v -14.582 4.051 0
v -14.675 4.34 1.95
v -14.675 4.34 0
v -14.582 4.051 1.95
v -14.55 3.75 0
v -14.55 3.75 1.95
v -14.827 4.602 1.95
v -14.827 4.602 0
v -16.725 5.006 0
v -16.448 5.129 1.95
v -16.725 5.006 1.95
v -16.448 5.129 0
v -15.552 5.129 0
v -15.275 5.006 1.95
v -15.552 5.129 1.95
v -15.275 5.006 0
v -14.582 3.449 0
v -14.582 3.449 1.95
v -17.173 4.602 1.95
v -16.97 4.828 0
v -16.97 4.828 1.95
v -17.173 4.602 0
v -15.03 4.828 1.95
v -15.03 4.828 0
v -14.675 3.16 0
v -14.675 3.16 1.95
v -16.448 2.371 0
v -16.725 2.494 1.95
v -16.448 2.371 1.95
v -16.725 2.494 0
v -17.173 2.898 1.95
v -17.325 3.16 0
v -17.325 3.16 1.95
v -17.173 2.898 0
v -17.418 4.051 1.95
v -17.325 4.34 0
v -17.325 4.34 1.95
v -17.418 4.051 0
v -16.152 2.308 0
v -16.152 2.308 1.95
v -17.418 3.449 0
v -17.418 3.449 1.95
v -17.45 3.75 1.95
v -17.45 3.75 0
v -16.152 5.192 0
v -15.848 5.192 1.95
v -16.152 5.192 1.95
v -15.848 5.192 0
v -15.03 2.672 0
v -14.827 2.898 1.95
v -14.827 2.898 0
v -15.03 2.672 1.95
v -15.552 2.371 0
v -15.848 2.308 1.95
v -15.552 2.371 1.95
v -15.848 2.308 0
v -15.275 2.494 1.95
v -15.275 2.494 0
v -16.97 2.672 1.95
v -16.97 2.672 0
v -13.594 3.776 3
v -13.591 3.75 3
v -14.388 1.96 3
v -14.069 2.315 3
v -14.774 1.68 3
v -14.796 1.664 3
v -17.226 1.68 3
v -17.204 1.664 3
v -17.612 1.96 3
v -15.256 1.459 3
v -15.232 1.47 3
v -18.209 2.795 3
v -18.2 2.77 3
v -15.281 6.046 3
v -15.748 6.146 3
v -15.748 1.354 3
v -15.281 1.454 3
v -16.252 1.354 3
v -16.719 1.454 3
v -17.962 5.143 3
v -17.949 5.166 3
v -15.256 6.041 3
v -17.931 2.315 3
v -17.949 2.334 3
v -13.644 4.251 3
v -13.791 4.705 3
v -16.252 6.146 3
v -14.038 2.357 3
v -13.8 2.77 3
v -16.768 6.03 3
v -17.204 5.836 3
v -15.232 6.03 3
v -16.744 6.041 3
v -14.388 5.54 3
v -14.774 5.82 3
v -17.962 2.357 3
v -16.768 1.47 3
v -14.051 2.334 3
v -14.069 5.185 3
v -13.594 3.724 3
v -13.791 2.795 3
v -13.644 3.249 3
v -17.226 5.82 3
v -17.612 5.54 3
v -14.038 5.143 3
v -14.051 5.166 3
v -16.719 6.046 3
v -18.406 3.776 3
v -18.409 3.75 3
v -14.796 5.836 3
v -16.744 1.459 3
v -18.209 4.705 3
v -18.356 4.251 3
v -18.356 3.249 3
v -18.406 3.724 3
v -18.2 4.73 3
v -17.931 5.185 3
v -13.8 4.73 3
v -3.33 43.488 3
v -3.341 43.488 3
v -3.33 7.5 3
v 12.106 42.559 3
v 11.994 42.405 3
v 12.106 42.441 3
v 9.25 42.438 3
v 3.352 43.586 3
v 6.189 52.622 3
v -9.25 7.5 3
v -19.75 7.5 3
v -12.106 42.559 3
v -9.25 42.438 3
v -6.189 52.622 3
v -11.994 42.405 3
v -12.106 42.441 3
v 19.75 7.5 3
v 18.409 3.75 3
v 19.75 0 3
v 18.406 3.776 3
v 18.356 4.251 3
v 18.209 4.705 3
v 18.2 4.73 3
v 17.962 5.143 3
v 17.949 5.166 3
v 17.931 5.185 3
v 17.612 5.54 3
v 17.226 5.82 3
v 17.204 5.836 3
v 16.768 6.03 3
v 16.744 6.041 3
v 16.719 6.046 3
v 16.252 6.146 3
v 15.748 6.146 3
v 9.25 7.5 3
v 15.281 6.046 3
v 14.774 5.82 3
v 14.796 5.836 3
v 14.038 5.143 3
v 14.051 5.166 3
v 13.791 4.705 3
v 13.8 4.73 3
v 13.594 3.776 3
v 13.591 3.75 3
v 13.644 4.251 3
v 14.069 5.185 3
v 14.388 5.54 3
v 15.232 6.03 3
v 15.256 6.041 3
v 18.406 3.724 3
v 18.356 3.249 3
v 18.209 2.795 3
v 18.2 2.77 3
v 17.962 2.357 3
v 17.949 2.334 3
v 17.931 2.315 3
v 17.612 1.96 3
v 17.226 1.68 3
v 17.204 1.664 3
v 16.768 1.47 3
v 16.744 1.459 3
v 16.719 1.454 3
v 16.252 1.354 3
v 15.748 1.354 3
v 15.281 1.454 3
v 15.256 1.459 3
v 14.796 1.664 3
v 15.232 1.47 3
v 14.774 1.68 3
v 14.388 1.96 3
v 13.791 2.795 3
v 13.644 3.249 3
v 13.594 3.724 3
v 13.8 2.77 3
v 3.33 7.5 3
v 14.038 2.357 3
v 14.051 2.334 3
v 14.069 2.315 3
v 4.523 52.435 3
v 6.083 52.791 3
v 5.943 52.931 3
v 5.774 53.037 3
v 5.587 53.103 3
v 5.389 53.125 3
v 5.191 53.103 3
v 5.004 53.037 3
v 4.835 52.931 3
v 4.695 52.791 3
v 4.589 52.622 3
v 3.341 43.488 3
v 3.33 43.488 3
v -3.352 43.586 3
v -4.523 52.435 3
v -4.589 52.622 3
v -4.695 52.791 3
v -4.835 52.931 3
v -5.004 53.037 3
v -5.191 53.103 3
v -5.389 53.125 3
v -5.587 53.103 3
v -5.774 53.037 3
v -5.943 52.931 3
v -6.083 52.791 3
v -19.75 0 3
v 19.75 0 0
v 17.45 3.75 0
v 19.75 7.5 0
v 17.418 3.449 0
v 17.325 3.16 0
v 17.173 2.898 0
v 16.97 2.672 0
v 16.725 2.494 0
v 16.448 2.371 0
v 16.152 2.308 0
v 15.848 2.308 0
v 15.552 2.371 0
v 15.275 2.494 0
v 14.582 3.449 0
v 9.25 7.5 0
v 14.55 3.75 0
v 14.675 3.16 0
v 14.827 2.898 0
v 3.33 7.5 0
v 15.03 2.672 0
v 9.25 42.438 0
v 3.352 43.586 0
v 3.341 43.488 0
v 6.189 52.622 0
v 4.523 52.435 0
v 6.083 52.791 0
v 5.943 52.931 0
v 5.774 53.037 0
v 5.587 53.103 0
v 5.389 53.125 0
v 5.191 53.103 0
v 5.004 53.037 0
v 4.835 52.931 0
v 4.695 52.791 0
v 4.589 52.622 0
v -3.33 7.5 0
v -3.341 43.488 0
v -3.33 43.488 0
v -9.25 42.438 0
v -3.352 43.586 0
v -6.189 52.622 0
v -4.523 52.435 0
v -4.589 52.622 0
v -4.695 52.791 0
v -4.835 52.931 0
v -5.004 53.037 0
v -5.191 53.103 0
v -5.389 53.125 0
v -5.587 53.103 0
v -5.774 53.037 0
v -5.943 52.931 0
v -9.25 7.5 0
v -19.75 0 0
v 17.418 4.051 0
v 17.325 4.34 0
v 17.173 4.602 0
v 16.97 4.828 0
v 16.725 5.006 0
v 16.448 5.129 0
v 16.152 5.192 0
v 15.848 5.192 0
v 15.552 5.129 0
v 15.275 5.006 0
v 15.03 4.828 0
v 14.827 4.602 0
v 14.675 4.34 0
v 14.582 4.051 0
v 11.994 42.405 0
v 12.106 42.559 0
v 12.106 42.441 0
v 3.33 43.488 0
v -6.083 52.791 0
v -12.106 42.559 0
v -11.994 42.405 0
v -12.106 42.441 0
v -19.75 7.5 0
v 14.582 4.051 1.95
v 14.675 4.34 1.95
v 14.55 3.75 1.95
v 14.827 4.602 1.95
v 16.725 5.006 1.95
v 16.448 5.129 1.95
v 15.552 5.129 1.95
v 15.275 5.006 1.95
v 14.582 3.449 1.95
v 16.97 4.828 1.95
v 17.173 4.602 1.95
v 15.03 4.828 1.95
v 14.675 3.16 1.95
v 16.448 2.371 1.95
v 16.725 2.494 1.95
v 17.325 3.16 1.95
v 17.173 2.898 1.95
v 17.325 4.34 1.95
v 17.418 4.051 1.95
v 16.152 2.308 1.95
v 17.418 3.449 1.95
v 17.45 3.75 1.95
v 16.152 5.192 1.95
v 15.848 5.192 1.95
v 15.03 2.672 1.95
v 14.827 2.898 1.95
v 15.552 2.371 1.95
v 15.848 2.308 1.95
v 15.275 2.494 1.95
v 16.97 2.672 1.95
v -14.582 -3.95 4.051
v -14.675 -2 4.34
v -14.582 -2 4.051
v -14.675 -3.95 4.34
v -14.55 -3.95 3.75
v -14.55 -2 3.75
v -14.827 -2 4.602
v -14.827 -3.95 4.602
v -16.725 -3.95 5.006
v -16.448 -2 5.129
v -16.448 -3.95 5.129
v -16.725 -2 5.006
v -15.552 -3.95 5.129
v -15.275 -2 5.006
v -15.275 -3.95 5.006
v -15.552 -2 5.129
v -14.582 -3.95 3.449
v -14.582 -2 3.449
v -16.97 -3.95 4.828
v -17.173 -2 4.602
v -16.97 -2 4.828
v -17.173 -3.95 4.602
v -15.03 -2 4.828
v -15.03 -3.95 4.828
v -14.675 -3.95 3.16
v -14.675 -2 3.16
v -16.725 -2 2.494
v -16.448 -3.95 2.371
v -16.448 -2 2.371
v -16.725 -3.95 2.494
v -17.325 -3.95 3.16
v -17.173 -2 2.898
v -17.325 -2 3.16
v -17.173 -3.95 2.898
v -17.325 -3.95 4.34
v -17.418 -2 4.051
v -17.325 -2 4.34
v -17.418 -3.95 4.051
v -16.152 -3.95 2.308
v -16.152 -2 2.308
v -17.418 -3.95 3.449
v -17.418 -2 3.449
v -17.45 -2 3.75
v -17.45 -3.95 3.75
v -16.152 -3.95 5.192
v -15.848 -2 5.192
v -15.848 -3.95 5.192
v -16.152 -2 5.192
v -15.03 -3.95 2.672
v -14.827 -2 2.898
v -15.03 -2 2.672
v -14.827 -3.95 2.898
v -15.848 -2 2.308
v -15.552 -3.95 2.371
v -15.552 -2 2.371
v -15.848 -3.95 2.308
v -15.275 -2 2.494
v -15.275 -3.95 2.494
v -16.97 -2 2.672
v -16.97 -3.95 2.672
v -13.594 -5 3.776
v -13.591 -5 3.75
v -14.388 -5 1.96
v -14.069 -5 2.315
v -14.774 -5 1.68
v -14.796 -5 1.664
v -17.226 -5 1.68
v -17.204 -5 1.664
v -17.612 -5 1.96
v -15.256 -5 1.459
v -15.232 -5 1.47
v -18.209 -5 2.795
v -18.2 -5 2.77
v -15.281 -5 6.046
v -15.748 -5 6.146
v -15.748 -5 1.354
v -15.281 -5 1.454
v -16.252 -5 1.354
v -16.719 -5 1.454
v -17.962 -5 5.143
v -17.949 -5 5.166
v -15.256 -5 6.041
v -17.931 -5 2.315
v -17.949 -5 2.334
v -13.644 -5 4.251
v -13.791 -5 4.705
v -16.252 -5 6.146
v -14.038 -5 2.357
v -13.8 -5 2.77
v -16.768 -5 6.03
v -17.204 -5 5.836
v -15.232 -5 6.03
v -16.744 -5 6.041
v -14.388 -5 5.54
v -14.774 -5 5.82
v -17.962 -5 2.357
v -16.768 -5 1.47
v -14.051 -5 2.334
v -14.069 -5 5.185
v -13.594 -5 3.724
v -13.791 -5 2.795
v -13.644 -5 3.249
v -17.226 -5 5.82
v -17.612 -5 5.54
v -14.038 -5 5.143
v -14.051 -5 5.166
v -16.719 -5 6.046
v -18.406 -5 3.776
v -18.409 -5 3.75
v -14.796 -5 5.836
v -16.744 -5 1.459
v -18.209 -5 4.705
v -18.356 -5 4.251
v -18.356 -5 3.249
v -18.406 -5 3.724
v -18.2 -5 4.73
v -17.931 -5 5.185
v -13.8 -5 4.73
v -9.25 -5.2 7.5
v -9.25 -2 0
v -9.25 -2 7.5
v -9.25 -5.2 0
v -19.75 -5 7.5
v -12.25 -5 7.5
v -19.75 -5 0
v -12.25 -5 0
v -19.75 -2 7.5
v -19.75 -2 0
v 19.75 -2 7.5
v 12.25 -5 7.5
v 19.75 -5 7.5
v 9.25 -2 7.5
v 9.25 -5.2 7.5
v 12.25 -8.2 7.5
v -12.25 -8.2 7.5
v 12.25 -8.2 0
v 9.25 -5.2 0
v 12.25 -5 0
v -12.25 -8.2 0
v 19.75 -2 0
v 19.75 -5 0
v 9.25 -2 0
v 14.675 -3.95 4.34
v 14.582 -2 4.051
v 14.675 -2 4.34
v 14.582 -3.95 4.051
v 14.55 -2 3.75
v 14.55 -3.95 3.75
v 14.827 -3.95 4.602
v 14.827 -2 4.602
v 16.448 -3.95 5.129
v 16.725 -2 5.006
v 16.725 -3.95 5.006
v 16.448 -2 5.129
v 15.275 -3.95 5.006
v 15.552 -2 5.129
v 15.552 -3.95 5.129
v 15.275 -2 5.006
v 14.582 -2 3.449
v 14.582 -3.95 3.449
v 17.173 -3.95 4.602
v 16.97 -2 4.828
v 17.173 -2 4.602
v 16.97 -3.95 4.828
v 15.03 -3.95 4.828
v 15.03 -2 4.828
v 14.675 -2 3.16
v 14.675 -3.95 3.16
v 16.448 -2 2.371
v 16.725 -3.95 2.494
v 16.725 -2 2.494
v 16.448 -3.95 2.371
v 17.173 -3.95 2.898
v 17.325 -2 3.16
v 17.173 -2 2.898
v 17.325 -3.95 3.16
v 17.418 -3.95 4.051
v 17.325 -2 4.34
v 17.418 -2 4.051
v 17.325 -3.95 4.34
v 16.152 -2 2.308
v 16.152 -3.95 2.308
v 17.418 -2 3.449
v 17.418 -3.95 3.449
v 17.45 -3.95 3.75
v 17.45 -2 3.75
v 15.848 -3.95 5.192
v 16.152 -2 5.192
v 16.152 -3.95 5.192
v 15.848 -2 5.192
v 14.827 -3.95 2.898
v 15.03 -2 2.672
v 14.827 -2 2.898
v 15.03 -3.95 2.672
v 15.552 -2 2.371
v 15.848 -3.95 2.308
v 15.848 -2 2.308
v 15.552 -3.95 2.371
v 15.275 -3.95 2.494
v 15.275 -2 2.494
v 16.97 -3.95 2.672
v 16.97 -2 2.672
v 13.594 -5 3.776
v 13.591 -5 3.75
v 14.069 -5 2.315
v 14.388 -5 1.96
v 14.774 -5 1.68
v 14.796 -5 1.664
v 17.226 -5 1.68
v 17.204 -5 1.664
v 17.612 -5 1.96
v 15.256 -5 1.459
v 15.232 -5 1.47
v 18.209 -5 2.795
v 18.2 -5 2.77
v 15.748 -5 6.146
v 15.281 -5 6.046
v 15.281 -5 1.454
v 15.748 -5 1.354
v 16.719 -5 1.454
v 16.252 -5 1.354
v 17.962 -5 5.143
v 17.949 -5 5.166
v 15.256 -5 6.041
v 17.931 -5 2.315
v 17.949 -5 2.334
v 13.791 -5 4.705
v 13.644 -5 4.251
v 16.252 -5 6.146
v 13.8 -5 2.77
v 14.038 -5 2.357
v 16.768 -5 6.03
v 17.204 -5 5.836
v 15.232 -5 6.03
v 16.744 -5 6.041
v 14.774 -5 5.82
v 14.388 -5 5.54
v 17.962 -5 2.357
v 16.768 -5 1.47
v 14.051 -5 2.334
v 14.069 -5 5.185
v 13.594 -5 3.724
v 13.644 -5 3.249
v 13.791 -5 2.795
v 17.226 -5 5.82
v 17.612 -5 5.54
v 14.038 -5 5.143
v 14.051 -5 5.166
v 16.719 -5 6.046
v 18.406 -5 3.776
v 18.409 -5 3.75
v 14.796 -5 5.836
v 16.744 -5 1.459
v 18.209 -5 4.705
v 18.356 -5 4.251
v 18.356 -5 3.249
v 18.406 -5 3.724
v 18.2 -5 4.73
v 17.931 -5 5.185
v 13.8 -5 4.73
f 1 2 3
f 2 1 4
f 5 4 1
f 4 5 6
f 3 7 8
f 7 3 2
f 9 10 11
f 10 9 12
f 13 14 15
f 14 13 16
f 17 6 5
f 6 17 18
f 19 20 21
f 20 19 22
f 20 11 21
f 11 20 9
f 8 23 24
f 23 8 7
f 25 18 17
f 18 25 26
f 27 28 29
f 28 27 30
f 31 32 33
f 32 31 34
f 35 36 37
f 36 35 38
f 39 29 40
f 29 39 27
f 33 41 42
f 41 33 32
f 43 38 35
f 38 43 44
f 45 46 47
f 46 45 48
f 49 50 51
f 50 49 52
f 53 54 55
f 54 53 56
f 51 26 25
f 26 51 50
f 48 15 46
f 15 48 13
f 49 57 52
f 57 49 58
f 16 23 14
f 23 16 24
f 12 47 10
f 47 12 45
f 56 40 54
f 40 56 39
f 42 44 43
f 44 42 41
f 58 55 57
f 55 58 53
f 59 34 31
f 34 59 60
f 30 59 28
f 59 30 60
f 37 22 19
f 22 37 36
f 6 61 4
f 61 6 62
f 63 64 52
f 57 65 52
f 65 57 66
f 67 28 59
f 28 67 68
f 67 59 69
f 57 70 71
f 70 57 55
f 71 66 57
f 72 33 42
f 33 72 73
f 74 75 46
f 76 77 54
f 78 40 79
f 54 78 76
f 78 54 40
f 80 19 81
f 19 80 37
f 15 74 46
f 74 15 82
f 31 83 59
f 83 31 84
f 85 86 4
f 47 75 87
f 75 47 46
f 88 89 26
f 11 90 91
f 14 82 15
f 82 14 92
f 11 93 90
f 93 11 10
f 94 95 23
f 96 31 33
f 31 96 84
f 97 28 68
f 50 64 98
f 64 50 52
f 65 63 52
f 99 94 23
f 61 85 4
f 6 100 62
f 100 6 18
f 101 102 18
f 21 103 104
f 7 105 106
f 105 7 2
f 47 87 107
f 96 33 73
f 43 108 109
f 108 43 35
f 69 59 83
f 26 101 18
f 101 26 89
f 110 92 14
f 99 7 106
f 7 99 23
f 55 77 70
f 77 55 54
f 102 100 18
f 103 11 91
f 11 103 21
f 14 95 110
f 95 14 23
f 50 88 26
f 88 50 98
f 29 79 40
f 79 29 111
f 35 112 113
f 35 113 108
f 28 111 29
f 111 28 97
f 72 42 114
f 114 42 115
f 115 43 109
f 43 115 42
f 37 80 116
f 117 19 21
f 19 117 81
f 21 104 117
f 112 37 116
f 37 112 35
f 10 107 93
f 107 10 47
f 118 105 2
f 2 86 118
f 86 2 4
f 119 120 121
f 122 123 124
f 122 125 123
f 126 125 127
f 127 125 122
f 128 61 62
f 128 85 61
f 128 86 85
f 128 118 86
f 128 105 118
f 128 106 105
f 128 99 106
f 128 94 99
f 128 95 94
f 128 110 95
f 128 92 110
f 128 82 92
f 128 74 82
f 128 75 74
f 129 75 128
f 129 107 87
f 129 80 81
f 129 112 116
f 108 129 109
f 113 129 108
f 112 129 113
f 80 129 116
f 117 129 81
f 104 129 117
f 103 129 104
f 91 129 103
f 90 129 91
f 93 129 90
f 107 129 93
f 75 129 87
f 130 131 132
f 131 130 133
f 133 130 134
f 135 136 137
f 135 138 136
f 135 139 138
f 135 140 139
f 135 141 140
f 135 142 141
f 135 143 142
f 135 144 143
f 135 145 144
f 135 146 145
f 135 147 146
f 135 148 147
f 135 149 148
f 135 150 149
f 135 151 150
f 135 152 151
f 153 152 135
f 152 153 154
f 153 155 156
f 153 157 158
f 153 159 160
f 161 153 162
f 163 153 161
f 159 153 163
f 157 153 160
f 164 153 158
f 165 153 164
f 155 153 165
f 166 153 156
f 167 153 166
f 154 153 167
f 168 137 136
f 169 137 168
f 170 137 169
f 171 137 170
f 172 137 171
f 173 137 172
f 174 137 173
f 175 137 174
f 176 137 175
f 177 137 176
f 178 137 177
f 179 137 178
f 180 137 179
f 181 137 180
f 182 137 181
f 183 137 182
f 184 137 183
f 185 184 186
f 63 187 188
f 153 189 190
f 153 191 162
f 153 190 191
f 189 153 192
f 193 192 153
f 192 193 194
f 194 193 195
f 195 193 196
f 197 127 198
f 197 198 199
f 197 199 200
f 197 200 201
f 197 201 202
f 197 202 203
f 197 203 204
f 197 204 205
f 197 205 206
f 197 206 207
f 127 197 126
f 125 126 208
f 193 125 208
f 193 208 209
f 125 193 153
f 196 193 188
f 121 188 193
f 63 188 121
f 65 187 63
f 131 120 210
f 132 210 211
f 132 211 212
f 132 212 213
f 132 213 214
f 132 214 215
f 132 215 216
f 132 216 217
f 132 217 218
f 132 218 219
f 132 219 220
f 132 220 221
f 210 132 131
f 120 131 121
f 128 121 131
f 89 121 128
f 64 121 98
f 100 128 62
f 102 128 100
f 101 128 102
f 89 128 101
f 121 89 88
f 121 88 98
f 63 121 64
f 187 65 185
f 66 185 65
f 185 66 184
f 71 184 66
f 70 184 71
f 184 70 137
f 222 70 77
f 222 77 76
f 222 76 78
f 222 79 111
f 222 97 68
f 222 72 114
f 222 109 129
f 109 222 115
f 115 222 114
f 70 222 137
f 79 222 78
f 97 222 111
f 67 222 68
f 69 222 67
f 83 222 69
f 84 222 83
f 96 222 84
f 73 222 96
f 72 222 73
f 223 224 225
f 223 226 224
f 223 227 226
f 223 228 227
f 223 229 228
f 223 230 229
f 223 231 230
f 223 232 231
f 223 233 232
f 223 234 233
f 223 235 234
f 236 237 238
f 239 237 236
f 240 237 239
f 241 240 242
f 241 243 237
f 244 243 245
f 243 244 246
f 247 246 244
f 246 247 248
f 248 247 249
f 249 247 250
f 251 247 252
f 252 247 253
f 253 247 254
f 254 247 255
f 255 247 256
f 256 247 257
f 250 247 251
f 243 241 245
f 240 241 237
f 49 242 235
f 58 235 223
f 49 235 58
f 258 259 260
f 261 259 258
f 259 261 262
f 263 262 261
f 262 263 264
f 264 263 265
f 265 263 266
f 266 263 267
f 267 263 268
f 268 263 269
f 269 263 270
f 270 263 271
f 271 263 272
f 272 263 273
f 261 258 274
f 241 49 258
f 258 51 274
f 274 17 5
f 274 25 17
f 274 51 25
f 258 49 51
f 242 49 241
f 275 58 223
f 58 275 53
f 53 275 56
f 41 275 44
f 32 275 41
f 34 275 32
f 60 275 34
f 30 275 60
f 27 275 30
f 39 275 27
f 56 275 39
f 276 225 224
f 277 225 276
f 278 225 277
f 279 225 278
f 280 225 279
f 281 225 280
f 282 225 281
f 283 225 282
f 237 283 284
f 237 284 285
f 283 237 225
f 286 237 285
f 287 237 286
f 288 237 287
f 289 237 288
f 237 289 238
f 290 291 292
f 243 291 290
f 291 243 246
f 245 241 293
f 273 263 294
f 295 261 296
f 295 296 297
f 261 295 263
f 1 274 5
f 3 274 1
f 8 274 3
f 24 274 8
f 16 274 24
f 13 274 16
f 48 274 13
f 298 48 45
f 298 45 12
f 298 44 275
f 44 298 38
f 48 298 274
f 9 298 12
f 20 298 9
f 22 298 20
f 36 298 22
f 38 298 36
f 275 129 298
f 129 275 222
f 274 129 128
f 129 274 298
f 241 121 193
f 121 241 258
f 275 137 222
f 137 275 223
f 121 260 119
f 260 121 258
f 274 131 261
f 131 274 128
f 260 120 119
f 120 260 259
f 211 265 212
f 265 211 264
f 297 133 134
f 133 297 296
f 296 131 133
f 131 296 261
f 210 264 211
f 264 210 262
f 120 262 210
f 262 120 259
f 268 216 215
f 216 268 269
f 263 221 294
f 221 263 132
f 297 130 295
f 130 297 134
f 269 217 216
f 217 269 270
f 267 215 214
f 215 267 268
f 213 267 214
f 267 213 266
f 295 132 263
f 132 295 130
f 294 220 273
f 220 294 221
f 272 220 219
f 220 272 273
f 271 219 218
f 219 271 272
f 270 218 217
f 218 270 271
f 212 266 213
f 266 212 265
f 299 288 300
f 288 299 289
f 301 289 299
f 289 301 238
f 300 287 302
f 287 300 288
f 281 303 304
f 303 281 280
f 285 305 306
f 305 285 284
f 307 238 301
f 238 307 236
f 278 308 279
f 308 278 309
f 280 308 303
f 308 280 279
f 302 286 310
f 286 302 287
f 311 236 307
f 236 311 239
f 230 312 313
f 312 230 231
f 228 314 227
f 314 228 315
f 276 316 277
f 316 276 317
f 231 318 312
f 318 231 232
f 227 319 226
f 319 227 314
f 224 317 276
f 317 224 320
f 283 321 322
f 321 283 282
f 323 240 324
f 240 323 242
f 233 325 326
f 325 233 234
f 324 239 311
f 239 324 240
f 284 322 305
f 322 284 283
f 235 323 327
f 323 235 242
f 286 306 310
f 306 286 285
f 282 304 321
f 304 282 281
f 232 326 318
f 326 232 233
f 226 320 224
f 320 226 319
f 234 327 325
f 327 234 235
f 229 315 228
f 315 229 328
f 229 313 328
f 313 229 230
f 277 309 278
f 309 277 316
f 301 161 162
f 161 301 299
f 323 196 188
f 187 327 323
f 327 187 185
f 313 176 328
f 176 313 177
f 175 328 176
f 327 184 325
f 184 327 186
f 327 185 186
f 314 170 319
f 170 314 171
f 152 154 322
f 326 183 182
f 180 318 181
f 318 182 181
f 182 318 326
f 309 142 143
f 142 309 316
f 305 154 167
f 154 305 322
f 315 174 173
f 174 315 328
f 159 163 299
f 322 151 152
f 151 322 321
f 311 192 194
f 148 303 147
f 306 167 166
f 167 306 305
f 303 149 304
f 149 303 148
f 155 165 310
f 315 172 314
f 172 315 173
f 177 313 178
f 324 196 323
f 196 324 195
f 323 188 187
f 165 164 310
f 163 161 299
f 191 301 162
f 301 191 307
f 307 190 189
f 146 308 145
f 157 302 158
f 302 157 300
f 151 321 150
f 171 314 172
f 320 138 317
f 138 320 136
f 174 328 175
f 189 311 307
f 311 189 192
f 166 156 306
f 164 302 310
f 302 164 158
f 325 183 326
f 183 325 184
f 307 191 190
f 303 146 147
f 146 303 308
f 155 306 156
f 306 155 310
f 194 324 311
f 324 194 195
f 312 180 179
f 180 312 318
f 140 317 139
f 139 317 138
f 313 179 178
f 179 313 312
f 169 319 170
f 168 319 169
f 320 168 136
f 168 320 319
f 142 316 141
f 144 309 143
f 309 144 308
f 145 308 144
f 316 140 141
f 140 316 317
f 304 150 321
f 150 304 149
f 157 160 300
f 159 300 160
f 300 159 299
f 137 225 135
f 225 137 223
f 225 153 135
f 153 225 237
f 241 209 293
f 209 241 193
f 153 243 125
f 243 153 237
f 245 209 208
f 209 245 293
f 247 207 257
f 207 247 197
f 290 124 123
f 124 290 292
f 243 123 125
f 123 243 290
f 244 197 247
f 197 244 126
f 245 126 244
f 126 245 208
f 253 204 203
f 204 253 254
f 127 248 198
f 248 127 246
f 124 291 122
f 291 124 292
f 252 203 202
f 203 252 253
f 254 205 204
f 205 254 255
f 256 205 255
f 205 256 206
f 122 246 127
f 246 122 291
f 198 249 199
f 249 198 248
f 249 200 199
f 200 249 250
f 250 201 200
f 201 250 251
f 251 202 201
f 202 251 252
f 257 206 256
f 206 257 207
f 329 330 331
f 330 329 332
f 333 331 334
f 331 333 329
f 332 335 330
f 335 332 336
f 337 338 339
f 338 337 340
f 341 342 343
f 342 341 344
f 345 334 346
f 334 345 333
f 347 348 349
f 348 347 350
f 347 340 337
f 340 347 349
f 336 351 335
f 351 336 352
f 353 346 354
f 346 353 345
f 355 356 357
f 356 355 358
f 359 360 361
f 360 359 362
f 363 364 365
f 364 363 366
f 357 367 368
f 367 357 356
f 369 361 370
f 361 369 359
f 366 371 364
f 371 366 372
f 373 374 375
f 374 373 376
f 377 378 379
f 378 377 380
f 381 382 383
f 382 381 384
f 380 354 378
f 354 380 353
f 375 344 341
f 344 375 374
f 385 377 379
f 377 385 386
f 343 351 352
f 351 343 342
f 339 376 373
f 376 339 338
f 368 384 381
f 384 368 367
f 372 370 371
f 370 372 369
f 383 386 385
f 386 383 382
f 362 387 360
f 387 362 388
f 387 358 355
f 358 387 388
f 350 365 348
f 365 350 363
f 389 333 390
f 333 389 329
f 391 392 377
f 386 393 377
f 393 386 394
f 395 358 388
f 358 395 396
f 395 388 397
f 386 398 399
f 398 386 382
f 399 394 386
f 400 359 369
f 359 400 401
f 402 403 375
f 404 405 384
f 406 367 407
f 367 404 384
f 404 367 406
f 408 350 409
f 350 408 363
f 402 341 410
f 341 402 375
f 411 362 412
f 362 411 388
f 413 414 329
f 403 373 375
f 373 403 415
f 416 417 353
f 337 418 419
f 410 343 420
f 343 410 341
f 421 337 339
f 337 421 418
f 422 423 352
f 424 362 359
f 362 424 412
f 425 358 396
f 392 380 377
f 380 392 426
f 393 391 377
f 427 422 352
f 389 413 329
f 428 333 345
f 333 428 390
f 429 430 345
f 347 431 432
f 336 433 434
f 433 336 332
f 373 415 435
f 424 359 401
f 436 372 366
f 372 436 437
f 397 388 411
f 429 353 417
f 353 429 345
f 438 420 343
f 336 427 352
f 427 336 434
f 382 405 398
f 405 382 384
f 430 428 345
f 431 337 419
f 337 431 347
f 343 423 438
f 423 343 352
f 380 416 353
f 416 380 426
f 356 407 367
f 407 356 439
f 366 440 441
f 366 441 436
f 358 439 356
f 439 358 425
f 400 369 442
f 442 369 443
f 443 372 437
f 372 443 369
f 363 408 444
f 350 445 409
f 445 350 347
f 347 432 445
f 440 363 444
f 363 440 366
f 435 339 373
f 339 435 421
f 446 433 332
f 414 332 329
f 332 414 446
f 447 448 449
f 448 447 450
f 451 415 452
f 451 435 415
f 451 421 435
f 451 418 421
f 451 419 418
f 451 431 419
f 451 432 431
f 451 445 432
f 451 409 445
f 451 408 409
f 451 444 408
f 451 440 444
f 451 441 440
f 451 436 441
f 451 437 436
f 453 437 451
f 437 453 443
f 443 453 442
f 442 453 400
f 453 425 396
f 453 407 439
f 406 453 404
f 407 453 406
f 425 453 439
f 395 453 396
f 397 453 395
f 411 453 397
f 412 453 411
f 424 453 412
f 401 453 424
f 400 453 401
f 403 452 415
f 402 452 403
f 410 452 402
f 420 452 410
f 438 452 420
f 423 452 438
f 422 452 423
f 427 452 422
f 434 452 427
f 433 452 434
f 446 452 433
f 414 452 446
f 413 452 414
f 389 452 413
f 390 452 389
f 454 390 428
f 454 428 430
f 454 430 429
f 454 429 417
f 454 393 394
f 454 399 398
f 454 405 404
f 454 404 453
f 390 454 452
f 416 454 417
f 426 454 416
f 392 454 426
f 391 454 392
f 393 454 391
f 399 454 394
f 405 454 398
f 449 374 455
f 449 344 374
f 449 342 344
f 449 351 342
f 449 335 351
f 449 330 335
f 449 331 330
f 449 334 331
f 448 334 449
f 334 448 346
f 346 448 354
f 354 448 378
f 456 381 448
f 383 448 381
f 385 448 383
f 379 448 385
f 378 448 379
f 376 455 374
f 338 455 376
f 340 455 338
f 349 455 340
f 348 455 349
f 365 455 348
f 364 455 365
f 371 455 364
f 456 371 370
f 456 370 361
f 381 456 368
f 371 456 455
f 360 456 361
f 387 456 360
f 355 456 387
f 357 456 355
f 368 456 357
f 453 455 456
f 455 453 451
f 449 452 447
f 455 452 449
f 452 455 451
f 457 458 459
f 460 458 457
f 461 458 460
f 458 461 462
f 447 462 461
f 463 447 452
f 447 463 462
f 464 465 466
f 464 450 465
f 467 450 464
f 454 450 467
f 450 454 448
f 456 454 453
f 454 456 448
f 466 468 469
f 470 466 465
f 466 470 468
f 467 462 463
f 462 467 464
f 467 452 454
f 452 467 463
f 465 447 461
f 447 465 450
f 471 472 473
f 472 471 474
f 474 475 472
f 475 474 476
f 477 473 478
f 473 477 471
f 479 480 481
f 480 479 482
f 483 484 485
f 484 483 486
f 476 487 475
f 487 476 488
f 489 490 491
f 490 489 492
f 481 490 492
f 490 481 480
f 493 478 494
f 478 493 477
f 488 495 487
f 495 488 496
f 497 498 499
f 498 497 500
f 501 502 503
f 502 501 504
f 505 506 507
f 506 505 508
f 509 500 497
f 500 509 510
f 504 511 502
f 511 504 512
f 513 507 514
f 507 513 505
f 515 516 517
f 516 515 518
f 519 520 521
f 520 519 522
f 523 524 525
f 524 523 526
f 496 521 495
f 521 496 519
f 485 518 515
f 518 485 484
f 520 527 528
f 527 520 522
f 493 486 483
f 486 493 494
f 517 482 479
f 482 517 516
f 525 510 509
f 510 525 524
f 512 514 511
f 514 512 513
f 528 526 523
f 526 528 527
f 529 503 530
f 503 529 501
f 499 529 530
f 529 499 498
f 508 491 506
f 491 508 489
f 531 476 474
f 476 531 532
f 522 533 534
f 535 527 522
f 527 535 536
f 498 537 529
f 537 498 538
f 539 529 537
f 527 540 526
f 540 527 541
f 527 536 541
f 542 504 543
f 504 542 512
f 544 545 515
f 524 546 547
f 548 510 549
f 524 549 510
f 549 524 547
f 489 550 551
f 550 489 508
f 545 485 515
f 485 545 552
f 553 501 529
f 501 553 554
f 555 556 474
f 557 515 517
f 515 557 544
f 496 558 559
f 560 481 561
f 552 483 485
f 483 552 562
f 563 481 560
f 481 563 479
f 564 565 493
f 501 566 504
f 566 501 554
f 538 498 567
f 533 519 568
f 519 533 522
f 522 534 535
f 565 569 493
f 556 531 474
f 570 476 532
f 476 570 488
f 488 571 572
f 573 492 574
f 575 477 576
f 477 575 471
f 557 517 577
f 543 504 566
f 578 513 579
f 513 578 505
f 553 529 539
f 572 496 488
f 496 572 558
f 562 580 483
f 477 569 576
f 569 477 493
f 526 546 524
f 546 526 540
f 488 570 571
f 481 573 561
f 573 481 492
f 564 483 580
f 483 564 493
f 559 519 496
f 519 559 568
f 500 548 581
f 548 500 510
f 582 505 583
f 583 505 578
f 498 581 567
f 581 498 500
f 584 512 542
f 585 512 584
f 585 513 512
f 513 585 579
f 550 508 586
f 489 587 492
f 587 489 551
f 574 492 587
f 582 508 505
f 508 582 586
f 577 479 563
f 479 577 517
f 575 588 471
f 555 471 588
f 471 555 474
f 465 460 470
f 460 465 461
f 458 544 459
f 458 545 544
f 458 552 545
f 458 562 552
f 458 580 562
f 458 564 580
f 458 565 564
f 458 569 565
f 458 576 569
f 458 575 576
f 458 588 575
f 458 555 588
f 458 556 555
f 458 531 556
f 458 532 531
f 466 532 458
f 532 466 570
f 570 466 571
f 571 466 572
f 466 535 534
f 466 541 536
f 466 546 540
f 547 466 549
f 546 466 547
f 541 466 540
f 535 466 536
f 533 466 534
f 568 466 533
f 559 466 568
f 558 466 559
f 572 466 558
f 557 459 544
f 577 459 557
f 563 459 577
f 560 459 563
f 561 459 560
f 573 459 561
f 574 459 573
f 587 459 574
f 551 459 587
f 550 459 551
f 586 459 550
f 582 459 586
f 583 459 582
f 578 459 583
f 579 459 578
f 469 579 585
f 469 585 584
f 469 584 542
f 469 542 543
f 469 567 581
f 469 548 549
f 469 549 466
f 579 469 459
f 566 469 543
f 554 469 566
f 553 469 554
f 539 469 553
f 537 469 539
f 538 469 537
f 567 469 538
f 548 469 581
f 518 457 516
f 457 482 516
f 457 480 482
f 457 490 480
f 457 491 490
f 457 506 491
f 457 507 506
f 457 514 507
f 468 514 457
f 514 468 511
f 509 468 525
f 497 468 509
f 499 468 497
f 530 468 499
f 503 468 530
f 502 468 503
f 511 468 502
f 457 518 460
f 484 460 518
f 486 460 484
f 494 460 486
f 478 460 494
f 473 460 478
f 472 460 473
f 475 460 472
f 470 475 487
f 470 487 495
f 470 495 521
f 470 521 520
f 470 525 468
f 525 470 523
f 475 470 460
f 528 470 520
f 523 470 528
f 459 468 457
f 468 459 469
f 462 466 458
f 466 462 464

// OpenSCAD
//
//  Snap mechanism
//
//  by Egil Kvaleberg
//

// Which part
view = "both"; 	// [demo, both, snap, bracket]

//
//  main parameters, tune as required:
//

// distance between centers of mount holes that seperate
mount_cc_dist = 35.0; 
mount_cc_width = 32.0;

// thickness of main part
thickness = 3.0; 

// mounting screw diameter
screw_dia = 2.5; // BUG: 3.0

screw_head = 2.0*screw_dia;

// tolerance
gap = 0.2; 

screw_land = screw_dia/2; // land outside of screw head

snap_width = mount_cc_width - 2*screw_land - screw_head - 2*thickness;  // width of mechanism proper
mount_width = mount_cc_width + 2*screw_land + screw_head;
mount_height = 2*screw_land + screw_head;
catch_width = snap_width * 0.15; // in addition to snap_width
snap_bar_width = (snap_width - 2.4 * catch_width) / 2; // room to flex
catch_min_width = 0.3 * snap_bar_width; // nicely rounded form
catch_length = (mount_height+mount_cc_dist) / 4;


d = 1*0.1;
$fs = 0.2;

module rounded_bar(r, h) {
	intersection() {
		cylinder(r=r, h=h);
		translate([0,0, h/2])
		cube([2*r * 0.85, 2*r* 0.85, h], center=true);
/*		hull() {
			translate([0, r, h/2 - r]) rotate([90,0,0]) cylinder(r=r, h=2*r);	
			translate([0, r, -(h/2 - r)]) rotate([90,0,0]) cylinder(r=r, h=2*r);		
		}
*/
	}
}

module screw_hole()
{
	sh = screw_head/2 - (screw_dia/2 + gap);	
	cylinder(r=screw_dia/2 + gap, h = d+thickness+d);
	translate([0, 0, d+thickness-sh])
		cylinder(r1=screw_dia/2 + gap, r2 = screw_head/2, h = sh+d);
}

module snap_half() {
	translate([-mount_width/2, 0, 0]) {
		// screw mount
		difference() {
			cube([mount_width/2 + d, mount_height, thickness]);
			translate([screw_land + screw_head/2, screw_land + screw_head/2, -d]) screw_hole();
		}
	}
	translate([-snap_width/2, 0, 0]) {
		// base arm
		cube([snap_bar_width, mount_height+mount_cc_dist+catch_min_width/2+d, thickness]);

		// catch
		translate([-catch_width, mount_height+mount_cc_dist, 0]) {
			hull() {
				cylinder(r=d, h=thickness); 
				translate([catch_width+snap_bar_width-catch_min_width/2, catch_min_width/2, 0]) 
					cylinder(r=catch_min_width/2, h=thickness); 
				// top of "arrow", sloping inwards to allow more bending
				translate([0.85 * (catch_width+snap_bar_width-catch_min_width/2), catch_length-catch_min_width/2, 0]) 
					cylinder(r=catch_min_width/2, h=thickness); 
			}
			//cube([catch_width, catch_length, thickness]);
		}

	}
}

module snap() {
	snap_half();
	mirror([1, 0, 0]) snap_half();	
}

module bracket_half() {

	translate([-mount_width/2, 0, 0]) {
		// screw mount
		difference() {
			cube([2*screw_land+screw_head+thickness, mount_height, thickness]);
			translate([screw_land + screw_head/2, screw_land + screw_head/2, -d]) screw_hole();
		}
		translate([2*screw_land+screw_head, 0, 0]) {
			cube([thickness, mount_height, thickness + gap + thickness]);
			translate([0, 0, gap + thickness]) {
				cube([snap_width/2 + thickness + d, mount_height, thickness]);
			}
		}

	}
}

module bracket() {
	bracket_half();
	mirror([1, 0, 0]) bracket_half();	
}

if (view == "demo") {
	snap();
	color("Red") translate([0, mount_cc_dist-d, 0]) bracket();
}
if (view == "snap") {
	snap();
}
if (view == "bracket") {
	translate([0, -2, 0]) rotate([90, 0, 0])  bracket();
}
if (view == "both") {
	snap();
	translate([0, -2, 0]) rotate([90, 0, 0])  bracket();
}
